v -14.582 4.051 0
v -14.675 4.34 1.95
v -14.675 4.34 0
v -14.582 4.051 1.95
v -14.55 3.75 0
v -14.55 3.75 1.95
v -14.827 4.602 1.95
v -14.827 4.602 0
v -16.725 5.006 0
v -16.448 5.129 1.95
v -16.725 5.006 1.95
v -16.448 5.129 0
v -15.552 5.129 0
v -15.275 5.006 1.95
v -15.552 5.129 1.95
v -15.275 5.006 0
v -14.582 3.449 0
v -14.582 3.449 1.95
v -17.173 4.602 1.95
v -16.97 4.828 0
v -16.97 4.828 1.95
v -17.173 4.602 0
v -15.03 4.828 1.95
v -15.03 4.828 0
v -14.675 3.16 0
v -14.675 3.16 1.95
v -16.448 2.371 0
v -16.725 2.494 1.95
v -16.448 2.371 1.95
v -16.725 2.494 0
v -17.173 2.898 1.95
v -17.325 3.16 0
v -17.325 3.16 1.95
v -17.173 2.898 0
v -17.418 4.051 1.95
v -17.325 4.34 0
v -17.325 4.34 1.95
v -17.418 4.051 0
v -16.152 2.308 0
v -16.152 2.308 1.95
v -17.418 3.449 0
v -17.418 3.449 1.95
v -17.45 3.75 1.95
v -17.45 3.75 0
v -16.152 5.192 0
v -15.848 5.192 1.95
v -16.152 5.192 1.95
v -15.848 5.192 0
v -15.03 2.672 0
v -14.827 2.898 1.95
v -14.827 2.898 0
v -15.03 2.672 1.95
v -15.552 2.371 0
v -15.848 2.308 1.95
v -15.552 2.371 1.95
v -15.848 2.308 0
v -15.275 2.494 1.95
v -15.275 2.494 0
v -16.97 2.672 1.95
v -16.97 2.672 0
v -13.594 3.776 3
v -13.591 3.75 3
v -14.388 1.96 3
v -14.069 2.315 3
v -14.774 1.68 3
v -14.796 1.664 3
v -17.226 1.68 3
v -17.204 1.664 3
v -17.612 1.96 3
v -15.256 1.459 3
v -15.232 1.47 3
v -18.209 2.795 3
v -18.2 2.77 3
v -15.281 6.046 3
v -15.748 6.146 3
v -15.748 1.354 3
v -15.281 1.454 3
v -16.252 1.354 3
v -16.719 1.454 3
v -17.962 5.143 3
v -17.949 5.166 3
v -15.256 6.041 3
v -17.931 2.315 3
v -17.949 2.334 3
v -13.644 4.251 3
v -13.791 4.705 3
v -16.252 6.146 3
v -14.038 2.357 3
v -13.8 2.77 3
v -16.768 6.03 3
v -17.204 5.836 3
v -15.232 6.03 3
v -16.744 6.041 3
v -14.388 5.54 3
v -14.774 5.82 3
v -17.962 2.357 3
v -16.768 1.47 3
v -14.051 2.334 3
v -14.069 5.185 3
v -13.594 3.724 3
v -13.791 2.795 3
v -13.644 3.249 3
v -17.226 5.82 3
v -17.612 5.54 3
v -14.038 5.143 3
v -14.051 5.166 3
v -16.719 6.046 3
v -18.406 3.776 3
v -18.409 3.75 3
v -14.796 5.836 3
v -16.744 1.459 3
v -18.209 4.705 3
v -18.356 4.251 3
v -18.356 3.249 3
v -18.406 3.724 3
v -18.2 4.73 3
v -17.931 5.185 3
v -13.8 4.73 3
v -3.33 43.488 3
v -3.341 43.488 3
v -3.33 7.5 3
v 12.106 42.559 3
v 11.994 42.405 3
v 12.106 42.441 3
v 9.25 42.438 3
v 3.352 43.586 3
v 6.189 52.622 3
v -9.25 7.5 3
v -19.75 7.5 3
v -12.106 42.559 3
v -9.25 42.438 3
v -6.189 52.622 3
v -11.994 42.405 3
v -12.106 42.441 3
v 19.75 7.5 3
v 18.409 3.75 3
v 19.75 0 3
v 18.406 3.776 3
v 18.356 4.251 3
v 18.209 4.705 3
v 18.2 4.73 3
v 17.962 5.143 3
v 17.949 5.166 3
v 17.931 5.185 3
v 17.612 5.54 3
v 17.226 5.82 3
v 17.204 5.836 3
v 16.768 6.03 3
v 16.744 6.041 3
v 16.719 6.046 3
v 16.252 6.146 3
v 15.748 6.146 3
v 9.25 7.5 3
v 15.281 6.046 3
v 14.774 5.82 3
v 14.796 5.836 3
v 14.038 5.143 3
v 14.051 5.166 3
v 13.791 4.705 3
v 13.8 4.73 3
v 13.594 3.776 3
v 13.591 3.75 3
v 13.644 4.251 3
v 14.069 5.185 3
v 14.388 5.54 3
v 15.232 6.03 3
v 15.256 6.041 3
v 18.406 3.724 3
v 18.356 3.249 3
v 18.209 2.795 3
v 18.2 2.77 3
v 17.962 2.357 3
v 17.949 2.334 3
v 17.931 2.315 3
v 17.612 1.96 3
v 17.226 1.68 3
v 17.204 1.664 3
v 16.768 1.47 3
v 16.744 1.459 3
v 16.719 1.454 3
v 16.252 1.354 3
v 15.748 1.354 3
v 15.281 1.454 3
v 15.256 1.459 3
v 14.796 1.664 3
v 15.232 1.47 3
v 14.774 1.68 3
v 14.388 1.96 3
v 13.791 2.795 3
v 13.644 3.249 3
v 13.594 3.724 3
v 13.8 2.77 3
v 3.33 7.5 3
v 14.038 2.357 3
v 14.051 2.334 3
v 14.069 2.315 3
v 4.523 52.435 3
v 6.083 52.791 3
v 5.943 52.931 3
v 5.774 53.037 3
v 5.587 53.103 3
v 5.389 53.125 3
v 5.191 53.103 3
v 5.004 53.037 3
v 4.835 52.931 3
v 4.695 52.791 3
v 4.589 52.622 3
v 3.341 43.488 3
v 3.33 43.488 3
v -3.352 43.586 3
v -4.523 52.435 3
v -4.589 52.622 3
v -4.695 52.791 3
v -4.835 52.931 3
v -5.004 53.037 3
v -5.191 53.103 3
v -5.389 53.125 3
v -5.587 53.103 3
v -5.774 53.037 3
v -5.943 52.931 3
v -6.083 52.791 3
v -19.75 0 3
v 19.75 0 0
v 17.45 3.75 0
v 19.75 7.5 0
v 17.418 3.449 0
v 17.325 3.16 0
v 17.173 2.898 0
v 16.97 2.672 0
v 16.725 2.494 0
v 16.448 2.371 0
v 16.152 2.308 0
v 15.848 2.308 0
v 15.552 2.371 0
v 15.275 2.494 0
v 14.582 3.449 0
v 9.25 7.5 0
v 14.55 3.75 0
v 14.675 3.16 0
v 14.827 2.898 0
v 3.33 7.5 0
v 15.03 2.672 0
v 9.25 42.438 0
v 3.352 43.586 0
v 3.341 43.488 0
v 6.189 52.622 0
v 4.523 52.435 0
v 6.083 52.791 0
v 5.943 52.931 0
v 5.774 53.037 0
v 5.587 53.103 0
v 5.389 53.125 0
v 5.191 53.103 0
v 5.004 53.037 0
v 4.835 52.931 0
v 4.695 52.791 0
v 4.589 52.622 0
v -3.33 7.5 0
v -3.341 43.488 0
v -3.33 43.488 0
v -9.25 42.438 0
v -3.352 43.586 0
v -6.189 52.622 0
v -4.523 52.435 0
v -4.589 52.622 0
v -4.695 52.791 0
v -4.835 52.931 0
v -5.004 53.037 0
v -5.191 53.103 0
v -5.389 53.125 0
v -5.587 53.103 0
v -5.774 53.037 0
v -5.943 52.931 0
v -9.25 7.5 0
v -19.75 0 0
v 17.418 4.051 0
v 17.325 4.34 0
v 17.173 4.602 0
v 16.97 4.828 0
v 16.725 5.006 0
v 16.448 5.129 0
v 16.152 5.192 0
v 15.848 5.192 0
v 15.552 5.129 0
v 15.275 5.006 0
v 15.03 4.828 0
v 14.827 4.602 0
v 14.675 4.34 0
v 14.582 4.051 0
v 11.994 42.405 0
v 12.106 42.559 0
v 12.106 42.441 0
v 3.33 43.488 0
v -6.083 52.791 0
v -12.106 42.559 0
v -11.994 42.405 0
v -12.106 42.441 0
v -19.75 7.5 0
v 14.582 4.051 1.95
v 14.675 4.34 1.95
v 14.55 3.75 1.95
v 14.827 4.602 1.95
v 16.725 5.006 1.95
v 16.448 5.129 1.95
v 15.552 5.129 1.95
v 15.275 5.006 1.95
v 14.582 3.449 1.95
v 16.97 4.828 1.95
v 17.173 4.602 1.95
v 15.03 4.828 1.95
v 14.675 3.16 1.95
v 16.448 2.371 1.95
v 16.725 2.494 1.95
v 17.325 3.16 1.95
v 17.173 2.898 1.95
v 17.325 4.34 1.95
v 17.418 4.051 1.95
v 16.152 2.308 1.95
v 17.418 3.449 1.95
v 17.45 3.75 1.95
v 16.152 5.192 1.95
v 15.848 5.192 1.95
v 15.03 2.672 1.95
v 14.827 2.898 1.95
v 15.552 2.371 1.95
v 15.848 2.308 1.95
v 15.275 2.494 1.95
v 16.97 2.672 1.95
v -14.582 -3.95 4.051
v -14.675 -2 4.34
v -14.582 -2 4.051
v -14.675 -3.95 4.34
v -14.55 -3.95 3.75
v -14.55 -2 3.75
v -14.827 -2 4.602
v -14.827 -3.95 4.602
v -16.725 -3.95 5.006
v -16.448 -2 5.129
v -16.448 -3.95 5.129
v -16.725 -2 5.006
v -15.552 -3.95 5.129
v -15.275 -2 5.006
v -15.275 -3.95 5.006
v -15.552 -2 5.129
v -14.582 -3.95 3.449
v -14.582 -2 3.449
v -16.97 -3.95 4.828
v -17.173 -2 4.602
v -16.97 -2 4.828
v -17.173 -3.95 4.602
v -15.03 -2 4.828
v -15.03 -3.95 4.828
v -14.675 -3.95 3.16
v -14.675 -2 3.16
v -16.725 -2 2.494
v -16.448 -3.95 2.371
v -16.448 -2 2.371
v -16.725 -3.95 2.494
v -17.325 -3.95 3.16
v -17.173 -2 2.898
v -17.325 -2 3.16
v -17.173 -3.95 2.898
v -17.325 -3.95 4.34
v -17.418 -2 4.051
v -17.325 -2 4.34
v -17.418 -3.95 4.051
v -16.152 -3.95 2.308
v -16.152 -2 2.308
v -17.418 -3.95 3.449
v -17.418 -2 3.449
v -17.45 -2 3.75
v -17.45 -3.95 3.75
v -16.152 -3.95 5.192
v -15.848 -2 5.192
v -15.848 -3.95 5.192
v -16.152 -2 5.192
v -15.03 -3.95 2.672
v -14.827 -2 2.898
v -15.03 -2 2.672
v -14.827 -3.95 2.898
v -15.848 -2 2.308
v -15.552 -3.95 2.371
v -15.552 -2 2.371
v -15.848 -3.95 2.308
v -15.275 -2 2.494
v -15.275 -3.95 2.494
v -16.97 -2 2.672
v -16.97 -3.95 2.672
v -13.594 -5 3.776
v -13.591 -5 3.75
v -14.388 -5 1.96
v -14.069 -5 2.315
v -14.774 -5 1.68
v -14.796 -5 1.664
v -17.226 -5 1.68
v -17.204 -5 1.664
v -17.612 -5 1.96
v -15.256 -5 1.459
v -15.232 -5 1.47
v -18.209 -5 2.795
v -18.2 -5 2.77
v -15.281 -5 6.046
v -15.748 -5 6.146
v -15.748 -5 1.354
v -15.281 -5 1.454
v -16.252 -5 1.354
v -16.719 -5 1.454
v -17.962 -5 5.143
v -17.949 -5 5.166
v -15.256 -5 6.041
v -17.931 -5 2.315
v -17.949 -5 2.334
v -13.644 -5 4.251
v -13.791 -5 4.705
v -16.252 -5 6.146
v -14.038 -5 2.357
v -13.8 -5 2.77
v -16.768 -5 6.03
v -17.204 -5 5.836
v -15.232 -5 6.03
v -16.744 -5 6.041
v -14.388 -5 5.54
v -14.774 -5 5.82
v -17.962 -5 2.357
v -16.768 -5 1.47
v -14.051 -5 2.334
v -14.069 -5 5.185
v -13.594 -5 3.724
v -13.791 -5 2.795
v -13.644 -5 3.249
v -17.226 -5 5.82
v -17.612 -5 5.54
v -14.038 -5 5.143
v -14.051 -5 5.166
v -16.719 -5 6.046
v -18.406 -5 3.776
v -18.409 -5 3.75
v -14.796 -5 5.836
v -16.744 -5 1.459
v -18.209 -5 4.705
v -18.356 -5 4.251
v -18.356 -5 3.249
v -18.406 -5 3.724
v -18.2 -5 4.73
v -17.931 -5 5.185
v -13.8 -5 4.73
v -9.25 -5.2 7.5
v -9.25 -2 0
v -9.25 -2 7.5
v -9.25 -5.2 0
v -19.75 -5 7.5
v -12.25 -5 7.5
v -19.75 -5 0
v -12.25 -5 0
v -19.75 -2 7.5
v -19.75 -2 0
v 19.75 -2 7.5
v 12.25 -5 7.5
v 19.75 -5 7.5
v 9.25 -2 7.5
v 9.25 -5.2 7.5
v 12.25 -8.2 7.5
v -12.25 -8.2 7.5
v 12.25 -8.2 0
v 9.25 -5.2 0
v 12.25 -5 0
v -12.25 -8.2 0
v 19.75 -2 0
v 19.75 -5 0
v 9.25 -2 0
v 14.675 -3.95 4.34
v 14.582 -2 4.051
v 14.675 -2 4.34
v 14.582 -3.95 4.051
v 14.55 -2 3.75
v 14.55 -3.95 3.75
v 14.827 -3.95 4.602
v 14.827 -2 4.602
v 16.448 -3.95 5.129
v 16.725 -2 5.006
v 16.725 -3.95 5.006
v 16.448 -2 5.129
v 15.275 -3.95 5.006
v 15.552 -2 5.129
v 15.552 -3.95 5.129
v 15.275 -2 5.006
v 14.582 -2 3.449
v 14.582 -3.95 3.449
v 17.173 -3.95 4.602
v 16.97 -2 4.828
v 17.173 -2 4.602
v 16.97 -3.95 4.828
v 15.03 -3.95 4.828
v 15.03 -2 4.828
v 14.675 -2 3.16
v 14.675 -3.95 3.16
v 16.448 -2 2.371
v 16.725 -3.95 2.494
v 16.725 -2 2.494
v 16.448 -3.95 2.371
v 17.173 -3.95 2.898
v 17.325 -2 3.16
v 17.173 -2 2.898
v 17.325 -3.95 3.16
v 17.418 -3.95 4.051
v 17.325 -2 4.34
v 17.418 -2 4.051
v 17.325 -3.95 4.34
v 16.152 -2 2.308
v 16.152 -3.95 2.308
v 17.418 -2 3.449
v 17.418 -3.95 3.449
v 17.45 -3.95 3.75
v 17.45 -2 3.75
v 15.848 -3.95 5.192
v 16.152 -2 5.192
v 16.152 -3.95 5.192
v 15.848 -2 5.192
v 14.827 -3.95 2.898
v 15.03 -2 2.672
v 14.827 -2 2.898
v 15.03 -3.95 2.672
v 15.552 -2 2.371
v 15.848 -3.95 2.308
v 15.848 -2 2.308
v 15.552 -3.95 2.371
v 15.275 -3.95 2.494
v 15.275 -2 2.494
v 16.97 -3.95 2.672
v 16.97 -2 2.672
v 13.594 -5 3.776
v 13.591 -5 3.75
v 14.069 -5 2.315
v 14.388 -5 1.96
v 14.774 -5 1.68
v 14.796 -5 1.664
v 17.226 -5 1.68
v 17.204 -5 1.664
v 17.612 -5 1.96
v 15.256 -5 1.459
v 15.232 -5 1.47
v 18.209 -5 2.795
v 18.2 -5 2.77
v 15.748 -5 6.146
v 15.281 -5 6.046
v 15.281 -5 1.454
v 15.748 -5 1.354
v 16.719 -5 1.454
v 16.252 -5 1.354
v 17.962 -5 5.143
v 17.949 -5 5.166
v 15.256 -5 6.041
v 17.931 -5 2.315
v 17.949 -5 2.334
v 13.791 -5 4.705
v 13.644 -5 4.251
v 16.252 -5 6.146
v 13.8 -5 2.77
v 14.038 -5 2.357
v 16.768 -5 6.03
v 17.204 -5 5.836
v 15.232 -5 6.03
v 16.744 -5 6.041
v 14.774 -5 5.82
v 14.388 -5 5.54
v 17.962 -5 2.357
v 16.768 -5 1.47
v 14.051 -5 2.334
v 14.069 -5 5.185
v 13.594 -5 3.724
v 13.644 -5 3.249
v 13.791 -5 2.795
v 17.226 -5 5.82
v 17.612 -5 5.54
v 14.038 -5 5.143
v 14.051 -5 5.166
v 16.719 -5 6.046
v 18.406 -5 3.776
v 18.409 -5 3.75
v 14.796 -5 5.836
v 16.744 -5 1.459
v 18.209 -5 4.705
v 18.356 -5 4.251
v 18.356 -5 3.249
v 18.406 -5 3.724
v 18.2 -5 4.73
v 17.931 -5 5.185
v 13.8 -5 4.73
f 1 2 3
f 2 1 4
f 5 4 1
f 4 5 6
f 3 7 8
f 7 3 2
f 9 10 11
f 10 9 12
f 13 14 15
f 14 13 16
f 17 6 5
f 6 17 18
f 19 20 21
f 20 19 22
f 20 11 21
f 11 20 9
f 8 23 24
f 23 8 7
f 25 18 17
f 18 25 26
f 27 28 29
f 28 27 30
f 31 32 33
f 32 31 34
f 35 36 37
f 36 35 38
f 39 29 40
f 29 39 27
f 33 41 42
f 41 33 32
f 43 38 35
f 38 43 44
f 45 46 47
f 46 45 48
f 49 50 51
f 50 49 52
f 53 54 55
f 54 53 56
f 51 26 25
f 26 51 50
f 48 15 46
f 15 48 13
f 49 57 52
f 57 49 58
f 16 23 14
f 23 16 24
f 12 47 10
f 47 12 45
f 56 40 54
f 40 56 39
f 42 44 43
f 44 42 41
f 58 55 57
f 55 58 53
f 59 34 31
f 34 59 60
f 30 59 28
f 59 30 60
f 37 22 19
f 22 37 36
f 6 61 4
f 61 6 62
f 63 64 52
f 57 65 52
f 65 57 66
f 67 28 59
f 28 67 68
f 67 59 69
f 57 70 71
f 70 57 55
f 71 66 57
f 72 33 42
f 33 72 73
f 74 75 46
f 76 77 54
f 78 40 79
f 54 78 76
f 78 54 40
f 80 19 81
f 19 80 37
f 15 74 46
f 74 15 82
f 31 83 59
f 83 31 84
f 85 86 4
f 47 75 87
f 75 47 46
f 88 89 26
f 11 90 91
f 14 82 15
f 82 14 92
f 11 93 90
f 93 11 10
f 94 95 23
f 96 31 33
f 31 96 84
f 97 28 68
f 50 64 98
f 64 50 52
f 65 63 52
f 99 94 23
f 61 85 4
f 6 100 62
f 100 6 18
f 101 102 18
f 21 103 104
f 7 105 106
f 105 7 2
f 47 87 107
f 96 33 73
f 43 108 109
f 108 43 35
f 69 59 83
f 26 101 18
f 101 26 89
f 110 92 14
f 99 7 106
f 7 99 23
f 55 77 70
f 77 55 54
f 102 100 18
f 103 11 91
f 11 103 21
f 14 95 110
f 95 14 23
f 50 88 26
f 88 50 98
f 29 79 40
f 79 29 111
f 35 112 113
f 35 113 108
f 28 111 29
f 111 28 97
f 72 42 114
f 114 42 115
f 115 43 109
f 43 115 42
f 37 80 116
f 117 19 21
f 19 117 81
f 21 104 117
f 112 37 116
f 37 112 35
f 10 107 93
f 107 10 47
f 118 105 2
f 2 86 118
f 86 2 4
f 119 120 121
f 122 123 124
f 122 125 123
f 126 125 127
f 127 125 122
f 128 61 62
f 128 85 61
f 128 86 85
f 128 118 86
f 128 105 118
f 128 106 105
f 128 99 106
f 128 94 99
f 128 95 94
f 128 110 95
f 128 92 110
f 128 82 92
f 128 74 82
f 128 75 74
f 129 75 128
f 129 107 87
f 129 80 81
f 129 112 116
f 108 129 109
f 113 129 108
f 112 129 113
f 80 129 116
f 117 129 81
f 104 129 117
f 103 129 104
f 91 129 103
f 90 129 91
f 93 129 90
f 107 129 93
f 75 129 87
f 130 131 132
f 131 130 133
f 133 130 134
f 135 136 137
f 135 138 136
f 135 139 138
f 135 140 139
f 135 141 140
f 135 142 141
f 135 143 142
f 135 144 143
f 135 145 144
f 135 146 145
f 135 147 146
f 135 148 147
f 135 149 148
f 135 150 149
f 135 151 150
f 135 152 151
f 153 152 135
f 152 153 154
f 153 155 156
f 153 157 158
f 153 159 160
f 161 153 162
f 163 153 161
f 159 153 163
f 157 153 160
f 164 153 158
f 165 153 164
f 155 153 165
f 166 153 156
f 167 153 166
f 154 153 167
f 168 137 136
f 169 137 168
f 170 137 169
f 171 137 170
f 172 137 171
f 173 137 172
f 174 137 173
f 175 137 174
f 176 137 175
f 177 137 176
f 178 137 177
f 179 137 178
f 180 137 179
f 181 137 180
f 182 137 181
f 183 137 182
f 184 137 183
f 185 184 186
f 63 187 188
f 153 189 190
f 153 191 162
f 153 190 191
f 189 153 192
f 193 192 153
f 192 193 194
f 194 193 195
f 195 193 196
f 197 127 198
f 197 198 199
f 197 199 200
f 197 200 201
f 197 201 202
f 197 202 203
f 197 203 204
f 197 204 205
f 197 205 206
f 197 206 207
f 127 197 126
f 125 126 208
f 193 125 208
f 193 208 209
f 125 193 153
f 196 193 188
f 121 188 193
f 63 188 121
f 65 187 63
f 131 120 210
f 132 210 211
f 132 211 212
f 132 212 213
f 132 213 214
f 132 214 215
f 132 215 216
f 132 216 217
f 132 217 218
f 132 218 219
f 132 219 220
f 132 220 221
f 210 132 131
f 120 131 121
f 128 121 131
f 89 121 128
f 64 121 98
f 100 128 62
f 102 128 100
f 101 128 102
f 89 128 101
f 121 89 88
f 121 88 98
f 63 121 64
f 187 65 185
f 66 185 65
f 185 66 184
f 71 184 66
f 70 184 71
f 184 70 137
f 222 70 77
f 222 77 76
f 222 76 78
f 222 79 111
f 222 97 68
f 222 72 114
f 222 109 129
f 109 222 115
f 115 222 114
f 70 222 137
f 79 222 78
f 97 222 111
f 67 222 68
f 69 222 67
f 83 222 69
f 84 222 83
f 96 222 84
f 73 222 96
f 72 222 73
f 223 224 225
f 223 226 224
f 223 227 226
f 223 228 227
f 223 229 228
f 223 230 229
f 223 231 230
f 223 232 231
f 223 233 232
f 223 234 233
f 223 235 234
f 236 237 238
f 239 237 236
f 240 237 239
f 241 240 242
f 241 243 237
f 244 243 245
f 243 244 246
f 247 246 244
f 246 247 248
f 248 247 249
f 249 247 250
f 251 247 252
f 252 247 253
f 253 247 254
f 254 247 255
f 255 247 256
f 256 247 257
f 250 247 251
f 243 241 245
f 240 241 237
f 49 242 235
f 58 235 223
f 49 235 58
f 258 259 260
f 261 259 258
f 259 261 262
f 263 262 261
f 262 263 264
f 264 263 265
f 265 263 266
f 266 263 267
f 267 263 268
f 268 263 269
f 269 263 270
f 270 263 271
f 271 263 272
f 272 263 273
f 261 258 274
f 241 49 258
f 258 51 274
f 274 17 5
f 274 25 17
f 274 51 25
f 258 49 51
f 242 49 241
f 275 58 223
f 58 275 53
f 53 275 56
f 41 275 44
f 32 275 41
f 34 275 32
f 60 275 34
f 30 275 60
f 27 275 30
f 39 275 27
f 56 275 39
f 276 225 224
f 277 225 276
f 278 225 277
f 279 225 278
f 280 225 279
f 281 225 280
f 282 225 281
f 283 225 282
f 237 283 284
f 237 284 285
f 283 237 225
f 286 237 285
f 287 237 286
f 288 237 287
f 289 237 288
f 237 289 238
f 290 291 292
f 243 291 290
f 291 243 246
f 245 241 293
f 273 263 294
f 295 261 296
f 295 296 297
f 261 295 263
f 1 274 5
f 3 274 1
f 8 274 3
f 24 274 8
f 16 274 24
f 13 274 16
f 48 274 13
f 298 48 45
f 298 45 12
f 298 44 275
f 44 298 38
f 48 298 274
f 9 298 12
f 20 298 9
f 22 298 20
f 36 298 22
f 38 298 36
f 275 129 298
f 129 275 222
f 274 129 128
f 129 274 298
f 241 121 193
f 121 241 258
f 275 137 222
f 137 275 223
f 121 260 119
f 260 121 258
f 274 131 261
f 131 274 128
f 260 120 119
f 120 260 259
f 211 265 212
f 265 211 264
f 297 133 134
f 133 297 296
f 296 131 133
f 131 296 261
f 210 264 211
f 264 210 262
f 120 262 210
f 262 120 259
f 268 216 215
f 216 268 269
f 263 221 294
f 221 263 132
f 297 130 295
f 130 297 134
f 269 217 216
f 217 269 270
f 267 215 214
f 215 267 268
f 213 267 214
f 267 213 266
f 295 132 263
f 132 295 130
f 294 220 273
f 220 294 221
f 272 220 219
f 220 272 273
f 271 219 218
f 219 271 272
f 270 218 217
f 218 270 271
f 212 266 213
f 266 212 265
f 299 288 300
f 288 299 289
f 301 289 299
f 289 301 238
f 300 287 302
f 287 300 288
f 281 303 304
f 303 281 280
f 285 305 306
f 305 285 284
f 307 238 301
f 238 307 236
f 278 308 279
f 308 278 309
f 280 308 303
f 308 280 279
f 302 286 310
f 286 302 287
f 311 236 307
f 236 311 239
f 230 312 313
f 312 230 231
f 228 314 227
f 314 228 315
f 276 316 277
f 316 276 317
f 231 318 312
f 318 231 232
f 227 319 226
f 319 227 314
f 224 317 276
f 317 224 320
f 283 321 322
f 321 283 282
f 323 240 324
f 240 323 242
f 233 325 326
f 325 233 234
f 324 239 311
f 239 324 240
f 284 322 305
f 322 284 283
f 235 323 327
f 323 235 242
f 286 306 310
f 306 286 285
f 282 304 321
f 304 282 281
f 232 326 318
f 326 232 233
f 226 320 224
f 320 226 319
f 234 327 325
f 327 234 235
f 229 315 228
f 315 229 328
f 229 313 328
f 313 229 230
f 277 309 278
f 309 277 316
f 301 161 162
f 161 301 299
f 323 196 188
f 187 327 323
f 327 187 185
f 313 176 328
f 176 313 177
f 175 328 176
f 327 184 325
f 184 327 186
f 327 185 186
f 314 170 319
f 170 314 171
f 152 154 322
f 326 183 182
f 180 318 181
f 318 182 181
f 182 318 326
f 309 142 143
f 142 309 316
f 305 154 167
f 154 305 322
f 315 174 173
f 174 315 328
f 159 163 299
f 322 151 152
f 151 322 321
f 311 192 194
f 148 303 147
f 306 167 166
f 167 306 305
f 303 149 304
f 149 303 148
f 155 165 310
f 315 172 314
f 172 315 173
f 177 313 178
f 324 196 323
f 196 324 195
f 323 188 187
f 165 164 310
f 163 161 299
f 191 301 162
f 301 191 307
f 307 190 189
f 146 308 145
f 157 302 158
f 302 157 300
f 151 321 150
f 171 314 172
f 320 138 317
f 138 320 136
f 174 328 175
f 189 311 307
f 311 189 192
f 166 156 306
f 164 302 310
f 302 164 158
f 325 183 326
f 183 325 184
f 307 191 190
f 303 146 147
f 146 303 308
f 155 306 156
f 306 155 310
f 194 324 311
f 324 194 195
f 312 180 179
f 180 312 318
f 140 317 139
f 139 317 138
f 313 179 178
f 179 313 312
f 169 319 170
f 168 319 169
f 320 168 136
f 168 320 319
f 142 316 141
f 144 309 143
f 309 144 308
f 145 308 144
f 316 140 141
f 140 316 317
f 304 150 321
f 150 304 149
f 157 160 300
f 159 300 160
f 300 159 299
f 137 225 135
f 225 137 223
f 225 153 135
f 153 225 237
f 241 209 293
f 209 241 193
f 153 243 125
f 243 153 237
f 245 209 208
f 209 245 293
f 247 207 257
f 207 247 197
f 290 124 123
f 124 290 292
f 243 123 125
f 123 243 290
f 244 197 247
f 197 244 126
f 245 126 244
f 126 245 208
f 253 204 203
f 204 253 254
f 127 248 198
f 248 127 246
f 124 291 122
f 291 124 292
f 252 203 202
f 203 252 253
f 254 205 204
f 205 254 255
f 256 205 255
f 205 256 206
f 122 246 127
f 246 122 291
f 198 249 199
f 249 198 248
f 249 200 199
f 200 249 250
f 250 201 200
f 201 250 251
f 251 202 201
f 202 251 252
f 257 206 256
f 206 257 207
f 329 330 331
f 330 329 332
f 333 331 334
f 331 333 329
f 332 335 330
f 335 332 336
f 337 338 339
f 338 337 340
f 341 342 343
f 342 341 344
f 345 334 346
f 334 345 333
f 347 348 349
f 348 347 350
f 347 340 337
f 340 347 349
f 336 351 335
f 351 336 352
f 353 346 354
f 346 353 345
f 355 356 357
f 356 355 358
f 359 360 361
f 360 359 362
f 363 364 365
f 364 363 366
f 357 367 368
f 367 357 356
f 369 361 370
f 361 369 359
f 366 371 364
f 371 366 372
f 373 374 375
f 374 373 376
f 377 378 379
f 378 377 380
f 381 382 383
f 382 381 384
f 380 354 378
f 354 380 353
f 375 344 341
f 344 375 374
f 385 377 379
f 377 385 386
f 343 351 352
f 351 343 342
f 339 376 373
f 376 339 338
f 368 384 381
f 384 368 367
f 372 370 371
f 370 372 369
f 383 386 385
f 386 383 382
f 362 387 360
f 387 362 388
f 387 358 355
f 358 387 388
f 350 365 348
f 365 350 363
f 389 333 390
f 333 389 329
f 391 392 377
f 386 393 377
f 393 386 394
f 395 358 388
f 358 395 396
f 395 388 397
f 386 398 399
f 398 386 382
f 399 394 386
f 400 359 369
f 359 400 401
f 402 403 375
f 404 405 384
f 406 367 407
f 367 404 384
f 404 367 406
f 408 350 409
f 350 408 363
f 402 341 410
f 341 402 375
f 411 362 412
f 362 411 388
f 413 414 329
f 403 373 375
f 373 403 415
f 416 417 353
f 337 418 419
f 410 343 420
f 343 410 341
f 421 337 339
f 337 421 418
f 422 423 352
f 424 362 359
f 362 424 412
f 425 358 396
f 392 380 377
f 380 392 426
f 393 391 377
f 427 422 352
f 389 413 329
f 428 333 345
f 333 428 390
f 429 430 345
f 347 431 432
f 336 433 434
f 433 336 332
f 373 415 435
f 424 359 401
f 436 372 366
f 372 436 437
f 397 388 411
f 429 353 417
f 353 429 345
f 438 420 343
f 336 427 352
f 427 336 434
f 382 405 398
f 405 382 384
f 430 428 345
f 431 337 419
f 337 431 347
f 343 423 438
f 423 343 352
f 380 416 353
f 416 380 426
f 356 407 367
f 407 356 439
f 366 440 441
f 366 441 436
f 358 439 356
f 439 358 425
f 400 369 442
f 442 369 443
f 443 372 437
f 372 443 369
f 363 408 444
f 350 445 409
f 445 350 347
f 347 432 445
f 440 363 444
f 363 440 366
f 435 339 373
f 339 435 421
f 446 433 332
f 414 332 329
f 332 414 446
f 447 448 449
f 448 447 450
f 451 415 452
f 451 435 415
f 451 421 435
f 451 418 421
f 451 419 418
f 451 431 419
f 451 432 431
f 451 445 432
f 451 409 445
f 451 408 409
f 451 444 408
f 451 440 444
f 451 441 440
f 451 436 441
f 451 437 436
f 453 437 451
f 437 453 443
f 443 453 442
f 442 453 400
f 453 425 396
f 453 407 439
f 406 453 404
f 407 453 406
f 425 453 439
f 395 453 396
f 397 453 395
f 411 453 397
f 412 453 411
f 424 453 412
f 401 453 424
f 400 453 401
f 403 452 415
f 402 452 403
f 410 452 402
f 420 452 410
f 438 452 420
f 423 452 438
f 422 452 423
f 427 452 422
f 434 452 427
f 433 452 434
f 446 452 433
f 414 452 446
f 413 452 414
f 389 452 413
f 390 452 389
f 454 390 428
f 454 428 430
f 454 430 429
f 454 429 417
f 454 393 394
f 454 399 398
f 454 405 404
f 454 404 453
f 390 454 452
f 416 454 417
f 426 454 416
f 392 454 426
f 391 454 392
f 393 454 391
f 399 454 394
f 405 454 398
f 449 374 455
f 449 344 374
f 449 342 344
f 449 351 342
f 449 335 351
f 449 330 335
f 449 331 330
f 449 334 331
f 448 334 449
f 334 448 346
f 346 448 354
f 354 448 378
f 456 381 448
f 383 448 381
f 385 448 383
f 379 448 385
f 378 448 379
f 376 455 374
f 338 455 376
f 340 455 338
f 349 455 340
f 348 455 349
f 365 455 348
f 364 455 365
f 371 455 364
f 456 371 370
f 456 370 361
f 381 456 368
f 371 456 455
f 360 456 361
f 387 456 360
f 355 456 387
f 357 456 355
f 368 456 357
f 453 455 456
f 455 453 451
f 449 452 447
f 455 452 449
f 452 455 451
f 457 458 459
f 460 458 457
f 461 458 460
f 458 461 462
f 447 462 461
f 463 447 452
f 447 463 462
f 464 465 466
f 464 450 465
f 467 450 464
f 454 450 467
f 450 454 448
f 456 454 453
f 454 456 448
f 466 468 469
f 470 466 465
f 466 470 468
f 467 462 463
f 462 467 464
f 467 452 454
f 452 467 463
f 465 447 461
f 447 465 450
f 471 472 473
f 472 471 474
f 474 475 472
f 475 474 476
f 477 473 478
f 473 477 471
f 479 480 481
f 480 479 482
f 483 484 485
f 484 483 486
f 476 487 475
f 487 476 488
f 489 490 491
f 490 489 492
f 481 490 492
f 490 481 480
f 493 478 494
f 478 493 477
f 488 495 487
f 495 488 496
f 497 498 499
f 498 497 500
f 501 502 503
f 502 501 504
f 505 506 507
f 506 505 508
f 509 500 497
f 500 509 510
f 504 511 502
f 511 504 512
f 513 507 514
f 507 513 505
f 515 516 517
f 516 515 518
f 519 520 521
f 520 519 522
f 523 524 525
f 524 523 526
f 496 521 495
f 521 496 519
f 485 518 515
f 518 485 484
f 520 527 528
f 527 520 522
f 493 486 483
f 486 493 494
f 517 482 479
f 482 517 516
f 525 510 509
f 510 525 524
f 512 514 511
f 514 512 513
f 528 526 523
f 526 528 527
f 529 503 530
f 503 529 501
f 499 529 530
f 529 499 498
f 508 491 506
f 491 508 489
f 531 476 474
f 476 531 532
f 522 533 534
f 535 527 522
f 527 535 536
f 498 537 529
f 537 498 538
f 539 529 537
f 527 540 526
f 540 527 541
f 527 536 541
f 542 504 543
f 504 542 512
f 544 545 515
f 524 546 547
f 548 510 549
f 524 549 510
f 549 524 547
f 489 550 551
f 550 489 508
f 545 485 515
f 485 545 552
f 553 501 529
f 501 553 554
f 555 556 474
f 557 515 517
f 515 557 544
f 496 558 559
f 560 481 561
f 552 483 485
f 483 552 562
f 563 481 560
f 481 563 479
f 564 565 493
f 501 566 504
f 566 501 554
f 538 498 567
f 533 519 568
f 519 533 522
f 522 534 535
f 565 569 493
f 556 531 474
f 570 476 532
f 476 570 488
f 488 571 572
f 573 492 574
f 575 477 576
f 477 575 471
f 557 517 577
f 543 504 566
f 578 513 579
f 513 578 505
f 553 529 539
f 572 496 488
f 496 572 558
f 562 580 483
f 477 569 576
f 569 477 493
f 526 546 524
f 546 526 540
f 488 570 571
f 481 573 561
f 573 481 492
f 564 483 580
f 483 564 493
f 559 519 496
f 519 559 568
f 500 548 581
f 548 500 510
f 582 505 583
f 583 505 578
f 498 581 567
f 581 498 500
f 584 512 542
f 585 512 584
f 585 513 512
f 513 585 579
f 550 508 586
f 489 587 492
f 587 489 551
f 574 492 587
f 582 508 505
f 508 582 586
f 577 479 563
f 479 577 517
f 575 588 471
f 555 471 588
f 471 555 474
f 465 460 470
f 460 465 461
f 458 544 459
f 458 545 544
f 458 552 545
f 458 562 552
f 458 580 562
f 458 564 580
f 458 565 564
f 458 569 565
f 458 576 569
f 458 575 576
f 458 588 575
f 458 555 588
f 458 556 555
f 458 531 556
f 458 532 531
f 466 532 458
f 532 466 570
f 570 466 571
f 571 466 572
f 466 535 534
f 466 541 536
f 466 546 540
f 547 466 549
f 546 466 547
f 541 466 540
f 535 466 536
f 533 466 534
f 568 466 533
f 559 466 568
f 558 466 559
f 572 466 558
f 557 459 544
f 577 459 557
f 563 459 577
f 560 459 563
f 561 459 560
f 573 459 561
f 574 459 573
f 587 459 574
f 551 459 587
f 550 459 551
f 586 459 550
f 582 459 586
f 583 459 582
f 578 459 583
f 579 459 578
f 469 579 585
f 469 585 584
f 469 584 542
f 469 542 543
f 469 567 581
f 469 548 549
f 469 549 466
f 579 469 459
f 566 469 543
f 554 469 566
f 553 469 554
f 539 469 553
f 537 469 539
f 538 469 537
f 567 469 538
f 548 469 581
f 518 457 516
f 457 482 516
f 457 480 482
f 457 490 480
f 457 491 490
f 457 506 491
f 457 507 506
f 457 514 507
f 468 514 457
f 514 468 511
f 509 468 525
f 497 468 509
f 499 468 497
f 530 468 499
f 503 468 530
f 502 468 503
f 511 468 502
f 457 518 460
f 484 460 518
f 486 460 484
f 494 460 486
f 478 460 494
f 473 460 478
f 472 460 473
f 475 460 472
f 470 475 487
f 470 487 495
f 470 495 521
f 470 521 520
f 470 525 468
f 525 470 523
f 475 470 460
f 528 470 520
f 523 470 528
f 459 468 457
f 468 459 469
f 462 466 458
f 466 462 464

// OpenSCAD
//
//  Snap mechanism
//
//  by Egil Kvaleberg
//

// Which part
view = "both"; 	// [demo, both, snap, bracket]

//
//  main parameters, tune as required:
//

// distance between centers of mount holes that seperate
mount_cc_dist = 35.0; 
mount_cc_width = 32.0;

// thickness of main part
thickness = 3.0; 

// mounting screw diameter
screw_dia = 2.5; // BUG: 3.0

screw_head = 2.0*screw_dia;

// tolerance
gap = 0.2; 

screw_land = screw_dia/2; // land outside of screw head

snap_width = mount_cc_width - 2*screw_land - screw_head - 2*thickness;  // width of mechanism proper
mount_width = mount_cc_width + 2*screw_land + screw_head;
mount_height = 2*screw_land + screw_head;
catch_width = snap_width * 0.15; // in addition to snap_width
snap_bar_width = (snap_width - 2.4 * catch_width) / 2; // room to flex
catch_min_width = 0.3 * snap_bar_width; // nicely rounded form
catch_length = (mount_height+mount_cc_dist) / 4;


d = 1*0.1;
$fs = 0.2;

module rounded_bar(r, h) {
	intersection() {
		cylinder(r=r, h=h);
		translate([0,0, h/2])
		cube([2*r * 0.85, 2*r* 0.85, h], center=true);
/*		hull() {
			translate([0, r, h/2 - r]) rotate([90,0,0]) cylinder(r=r, h=2*r);	
			translate([0, r, -(h/2 - r)]) rotate([90,0,0]) cylinder(r=r, h=2*r);		
		}
*/
	}
}

module screw_hole()
{
	sh = screw_head/2 - (screw_dia/2 + gap);	
	cylinder(r=screw_dia/2 + gap, h = d+thickness+d);
	translate([0, 0, d+thickness-sh])
		cylinder(r1=screw_dia/2 + gap, r2 = screw_head/2, h = sh+d);
}

module snap_half() {
	translate([-mount_width/2, 0, 0]) {
		// screw mount
		difference() {
			cube([mount_width/2 + d, mount_height, thickness]);
			translate([screw_land + screw_head/2, screw_land + screw_head/2, -d]) screw_hole();
		}
	}
	translate([-snap_width/2, 0, 0]) {
		// base arm
		cube([snap_bar_width, mount_height+mount_cc_dist+catch_min_width/2+d, thickness]);

		// catch
		translate([-catch_width, mount_height+mount_cc_dist, 0]) {
			hull() {
				cylinder(r=d, h=thickness); 
				translate([catch_width+snap_bar_width-catch_min_width/2, catch_min_width/2, 0]) 
					cylinder(r=catch_min_width/2, h=thickness); 
				// top of "arrow", sloping inwards to allow more bending
				translate([0.85 * (catch_width+snap_bar_width-catch_min_width/2), catch_length-catch_min_width/2, 0]) 
					cylinder(r=catch_min_width/2, h=thickness); 
			}
			//cube([catch_width, catch_length, thickness]);
		}

	}
}

module snap() {
	snap_half();
	mirror([1, 0, 0]) snap_half();	
}

module bracket_half() {

	translate([-mount_width/2, 0, 0]) {
		// screw mount
		difference() {
			cube([2*screw_land+screw_head+thickness, mount_height, thickness]);
			translate([screw_land + screw_head/2, screw_land + screw_head/2, -d]) screw_hole();
		}
		translate([2*screw_land+screw_head, 0, 0]) {
			cube([thickness, mount_height, thickness + gap + thickness]);
			translate([0, 0, gap + thickness]) {
				cube([snap_width/2 + thickness + d, mount_height, thickness]);
			}
		}

	}
}

module bracket() {
	bracket_half();
	mirror([1, 0, 0]) bracket_half();	
}

if (view == "demo") {
	snap();
	color("Red") translate([0, mount_cc_dist-d, 0]) bracket();
}
if (view == "snap") {
	snap();
}
if (view == "bracket") {
	translate([0, -2, 0]) rotate([90, 0, 0])  bracket();
}
if (view == "both") {
	snap();
	translate([0, -2, 0]) rotate([90, 0, 0])  bracket();
}
